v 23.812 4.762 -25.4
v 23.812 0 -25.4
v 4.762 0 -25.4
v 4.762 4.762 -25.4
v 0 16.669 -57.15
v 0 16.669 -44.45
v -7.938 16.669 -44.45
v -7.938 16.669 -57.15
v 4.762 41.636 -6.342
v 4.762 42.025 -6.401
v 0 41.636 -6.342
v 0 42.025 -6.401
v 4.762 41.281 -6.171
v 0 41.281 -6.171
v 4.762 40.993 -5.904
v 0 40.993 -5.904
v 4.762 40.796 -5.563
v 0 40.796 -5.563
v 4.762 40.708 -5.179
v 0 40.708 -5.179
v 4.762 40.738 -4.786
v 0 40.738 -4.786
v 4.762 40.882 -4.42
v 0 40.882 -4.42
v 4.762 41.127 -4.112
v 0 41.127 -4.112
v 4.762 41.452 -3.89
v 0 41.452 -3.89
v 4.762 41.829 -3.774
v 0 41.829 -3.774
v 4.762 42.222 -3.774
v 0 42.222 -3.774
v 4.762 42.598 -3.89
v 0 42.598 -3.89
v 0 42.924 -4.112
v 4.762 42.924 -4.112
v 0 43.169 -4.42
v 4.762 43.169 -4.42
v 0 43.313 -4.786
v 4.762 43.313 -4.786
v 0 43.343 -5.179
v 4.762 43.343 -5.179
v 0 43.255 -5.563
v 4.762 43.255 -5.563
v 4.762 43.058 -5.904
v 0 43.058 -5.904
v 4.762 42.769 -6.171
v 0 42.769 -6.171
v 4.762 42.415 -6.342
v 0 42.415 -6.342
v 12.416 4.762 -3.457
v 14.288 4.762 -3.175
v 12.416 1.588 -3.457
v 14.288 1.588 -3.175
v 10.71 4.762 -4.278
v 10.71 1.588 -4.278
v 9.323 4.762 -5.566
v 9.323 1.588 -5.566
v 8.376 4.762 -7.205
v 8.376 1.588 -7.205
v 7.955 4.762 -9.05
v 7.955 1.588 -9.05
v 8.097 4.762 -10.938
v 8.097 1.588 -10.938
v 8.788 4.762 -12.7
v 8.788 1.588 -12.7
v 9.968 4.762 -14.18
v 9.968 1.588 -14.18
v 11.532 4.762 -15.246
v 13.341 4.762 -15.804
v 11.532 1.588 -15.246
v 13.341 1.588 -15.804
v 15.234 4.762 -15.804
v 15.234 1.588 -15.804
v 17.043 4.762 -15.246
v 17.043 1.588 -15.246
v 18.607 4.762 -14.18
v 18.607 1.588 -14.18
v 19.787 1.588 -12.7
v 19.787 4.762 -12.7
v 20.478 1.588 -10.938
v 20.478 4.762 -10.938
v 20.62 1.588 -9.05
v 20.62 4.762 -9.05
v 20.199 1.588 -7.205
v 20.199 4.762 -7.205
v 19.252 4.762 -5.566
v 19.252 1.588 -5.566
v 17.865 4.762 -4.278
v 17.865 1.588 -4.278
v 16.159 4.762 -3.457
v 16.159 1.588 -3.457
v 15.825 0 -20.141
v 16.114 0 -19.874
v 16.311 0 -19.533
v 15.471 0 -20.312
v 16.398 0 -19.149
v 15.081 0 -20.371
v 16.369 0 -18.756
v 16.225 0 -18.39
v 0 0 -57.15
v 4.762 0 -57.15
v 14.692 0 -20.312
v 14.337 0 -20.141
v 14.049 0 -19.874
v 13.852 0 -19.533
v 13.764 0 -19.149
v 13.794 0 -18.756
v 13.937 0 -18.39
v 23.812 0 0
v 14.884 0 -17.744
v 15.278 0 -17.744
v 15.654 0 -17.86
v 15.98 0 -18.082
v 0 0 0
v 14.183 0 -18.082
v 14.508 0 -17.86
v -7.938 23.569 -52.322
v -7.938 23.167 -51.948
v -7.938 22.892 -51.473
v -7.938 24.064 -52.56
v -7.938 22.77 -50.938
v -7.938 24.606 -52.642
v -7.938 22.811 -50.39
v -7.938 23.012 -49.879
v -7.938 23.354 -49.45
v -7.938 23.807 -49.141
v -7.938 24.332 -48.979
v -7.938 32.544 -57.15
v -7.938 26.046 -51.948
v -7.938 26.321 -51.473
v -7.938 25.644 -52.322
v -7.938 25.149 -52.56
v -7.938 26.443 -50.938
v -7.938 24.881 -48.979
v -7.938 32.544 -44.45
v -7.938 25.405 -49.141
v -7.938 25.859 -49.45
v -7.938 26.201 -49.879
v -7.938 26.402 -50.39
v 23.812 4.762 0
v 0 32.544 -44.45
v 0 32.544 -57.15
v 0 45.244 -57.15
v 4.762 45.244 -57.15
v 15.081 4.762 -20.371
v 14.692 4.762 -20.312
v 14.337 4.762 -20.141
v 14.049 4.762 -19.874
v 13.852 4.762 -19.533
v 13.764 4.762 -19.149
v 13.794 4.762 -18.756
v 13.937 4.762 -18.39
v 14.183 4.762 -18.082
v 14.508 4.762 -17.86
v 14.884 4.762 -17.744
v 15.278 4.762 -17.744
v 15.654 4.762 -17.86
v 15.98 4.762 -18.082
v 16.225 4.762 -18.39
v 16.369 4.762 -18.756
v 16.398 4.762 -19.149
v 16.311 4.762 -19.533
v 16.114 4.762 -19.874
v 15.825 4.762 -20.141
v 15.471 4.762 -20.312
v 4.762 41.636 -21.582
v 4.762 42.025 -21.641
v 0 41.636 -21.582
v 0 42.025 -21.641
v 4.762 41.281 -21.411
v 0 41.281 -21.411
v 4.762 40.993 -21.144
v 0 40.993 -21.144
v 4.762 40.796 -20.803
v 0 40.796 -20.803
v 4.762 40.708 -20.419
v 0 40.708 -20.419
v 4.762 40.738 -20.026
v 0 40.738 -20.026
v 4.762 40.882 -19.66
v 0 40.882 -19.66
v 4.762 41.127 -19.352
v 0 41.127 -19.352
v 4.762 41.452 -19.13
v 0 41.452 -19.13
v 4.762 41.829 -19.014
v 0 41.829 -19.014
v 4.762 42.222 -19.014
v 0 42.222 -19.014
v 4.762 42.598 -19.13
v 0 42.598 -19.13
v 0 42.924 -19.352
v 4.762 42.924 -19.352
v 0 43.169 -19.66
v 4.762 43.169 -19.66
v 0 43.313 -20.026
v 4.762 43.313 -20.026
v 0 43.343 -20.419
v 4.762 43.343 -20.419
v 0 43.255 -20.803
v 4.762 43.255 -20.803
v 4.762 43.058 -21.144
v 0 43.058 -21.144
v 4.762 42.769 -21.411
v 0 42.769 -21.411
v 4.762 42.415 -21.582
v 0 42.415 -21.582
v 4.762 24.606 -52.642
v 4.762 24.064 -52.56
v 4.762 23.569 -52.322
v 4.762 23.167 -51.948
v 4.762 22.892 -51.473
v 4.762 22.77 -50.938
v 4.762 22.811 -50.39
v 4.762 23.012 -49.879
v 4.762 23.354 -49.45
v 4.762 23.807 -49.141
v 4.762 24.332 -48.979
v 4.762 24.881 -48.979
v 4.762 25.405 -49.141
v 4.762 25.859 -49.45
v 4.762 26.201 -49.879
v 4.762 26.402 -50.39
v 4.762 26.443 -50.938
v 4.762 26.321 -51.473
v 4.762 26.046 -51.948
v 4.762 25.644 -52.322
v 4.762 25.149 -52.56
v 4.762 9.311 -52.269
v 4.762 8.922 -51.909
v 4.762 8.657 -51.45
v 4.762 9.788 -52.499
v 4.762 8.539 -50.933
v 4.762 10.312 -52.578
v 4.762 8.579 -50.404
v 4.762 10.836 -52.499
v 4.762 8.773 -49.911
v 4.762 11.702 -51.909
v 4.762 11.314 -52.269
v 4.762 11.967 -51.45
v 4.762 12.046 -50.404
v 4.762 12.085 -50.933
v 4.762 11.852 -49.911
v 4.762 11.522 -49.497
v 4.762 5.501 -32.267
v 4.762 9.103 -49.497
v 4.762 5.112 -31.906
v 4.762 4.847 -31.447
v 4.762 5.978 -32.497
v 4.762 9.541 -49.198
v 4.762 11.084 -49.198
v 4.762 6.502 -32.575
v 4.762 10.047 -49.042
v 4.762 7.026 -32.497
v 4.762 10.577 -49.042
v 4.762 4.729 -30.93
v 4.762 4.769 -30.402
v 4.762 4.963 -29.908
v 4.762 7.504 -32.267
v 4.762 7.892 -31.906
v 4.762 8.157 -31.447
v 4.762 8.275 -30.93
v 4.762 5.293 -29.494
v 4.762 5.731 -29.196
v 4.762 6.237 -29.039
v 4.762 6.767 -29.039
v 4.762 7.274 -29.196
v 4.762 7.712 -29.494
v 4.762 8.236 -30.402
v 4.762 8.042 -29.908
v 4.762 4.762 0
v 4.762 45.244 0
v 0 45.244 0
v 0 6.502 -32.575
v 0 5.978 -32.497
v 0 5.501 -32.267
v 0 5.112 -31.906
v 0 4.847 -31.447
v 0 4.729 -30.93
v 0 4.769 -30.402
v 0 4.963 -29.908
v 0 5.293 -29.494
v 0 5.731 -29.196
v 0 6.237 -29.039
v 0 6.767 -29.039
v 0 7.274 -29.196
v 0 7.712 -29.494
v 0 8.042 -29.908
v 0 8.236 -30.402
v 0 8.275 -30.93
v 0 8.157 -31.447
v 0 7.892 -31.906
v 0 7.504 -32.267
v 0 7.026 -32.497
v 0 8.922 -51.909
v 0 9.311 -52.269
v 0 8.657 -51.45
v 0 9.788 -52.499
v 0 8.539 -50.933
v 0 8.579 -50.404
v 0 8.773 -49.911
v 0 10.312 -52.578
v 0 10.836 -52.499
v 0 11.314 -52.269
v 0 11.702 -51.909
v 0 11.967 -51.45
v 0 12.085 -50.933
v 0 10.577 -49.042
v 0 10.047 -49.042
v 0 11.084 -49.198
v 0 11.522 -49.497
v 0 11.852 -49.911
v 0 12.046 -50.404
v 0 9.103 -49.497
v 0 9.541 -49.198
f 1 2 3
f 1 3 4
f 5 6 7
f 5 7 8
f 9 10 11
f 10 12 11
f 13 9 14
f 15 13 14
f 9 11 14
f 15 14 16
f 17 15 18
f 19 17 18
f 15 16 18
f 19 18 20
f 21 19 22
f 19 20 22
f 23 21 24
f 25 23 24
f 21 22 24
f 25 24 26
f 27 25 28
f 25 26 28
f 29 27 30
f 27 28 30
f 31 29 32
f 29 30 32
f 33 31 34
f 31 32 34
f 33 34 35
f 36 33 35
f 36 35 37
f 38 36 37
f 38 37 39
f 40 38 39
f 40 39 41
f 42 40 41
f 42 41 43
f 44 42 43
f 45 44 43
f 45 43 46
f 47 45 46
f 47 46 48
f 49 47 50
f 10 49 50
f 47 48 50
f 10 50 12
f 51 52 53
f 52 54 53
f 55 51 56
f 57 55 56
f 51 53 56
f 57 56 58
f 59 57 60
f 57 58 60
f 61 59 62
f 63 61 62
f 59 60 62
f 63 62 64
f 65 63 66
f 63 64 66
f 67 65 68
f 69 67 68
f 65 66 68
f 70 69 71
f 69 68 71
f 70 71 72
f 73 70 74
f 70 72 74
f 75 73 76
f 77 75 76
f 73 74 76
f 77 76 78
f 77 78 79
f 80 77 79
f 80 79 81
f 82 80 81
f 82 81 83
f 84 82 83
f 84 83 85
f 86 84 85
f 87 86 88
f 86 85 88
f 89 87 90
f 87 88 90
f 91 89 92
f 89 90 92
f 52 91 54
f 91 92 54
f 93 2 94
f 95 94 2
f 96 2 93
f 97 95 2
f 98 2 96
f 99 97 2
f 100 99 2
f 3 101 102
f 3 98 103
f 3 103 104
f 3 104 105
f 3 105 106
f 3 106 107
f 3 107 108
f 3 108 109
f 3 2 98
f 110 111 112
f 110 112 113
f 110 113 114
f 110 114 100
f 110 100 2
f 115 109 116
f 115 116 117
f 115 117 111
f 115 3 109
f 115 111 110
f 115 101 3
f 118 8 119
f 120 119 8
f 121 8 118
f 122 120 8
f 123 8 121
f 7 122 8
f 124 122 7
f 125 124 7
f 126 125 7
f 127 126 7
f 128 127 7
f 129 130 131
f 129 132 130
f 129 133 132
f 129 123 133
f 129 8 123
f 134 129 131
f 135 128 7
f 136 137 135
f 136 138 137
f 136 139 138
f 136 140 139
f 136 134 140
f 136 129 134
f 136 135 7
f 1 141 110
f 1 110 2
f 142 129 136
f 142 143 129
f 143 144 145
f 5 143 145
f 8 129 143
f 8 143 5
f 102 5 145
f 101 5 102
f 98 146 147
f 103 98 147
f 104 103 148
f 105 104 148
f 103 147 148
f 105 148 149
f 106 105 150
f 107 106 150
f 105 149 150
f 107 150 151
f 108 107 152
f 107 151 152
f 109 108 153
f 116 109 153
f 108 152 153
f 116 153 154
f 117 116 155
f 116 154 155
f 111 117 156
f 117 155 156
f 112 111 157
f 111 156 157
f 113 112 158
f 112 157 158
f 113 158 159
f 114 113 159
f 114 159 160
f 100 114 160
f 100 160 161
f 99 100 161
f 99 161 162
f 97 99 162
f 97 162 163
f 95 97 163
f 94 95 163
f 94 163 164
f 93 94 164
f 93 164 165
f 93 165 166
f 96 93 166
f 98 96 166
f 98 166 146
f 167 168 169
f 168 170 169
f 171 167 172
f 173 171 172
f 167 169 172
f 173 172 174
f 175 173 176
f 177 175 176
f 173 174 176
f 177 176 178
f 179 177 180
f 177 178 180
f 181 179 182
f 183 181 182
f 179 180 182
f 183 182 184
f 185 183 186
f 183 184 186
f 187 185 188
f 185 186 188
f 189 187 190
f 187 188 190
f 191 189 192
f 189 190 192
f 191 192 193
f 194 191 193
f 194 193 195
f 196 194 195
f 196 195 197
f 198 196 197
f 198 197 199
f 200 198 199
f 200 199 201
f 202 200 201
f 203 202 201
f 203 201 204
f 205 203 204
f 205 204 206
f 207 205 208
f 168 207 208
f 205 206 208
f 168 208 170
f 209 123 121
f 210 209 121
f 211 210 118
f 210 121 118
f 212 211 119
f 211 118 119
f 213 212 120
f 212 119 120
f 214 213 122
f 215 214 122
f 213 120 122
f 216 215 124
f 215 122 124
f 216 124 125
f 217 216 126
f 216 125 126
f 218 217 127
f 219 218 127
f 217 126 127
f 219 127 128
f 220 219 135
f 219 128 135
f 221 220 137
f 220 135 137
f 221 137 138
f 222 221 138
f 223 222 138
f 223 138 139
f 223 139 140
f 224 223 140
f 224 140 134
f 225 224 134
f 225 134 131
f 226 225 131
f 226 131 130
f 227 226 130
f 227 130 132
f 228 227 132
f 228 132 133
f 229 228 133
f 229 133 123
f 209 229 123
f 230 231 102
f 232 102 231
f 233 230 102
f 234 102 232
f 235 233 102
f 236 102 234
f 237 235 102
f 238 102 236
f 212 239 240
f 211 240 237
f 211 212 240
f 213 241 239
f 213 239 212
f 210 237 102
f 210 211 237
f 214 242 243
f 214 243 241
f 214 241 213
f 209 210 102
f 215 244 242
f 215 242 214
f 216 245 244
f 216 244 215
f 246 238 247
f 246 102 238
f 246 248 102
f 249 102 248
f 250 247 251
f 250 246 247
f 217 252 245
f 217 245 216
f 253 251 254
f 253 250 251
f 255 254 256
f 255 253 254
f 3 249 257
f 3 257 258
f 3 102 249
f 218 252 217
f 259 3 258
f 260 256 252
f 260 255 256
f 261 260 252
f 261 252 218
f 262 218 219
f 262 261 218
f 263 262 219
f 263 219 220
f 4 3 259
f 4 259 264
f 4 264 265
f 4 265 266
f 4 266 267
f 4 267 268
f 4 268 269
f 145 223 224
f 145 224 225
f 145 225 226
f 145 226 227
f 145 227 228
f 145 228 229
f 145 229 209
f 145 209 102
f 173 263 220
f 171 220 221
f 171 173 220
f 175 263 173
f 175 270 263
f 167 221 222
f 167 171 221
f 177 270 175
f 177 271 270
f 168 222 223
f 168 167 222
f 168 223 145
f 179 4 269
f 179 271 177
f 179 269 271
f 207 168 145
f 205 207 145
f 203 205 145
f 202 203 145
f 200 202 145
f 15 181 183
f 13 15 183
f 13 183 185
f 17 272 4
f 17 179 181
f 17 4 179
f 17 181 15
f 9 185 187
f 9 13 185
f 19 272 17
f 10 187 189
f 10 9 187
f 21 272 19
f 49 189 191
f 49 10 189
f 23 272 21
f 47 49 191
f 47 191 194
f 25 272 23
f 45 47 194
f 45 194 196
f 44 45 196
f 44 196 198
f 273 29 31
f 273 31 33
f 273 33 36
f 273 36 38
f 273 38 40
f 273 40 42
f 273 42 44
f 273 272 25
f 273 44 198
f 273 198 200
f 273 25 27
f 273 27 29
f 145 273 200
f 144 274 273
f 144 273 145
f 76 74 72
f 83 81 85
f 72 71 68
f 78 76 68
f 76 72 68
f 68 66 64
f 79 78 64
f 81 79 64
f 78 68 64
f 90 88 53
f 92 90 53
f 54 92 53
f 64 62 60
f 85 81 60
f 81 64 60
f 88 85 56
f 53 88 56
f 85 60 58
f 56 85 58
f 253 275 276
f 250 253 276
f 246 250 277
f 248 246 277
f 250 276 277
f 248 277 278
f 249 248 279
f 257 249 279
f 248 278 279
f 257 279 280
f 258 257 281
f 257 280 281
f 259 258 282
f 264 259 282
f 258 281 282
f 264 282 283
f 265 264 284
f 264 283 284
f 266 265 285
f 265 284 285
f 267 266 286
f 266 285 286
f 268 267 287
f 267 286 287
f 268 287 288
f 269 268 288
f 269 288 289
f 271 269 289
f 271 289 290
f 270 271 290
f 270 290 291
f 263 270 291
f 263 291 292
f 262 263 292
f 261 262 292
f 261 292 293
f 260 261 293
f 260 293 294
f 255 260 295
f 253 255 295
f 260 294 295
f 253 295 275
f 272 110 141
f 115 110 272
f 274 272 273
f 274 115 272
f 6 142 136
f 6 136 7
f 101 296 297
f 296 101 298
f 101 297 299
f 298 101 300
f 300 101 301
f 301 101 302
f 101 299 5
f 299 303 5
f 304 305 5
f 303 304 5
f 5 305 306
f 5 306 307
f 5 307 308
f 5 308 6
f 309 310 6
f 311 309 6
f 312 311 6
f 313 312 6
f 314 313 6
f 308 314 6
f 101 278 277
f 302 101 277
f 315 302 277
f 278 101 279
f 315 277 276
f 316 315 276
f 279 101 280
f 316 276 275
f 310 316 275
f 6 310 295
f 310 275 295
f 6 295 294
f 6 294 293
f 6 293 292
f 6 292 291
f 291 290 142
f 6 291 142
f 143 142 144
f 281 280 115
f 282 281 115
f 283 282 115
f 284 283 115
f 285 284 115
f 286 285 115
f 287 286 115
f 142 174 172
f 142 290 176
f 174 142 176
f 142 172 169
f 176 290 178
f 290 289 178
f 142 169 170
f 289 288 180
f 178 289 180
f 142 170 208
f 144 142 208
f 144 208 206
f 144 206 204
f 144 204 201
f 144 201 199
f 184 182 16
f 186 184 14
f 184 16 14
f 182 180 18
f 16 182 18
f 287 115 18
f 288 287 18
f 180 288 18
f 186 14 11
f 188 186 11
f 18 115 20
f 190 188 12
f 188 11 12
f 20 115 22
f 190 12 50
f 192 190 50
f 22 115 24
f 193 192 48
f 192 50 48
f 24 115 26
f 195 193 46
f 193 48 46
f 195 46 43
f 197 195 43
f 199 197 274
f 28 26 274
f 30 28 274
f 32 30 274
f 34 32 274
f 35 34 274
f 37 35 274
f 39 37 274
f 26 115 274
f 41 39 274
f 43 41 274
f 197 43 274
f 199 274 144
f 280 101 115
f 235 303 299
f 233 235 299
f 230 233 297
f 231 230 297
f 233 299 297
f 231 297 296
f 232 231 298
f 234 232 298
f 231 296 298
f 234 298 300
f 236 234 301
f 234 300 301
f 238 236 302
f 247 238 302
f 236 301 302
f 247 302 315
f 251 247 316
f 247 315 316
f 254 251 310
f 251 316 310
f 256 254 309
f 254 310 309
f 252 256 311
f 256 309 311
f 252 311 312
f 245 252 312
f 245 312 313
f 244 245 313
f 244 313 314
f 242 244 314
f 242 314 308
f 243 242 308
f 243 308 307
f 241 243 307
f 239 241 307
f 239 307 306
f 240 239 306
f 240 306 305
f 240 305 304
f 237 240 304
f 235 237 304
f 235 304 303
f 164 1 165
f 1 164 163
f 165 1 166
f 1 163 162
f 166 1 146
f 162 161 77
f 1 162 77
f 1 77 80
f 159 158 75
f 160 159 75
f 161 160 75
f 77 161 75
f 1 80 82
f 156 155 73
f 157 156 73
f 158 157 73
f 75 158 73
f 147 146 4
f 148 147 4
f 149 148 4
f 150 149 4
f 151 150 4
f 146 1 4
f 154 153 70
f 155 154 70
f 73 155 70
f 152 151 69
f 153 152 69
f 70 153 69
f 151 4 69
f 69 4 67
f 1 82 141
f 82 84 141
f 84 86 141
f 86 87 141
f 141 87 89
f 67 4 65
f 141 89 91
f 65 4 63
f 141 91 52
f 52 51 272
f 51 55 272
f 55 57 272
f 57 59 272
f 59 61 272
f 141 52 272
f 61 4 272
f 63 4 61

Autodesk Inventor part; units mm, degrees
ref_plane "YZ Plane" through (0, 0, 0) normal (1, 0, 0) x (0, 1, 0)
ref_plane "XZ Plane" through (0, 0, 0) normal (0, 1, 0) x (-1, 0, 0)
ref_plane "XY Plane" through (0, 0, 0) normal (0, 0, 1) x (1, 0, 0)
sketch "Sketch1" plane through (0, 0, 0) normal (1, 0, 0) x (0, 1, 0)
  line L0 (0, 0) -> (45.2437, 0)
  line L1 (45.2437, 0) -> (45.2438, -57.15)
  line L2 (45.2438, -57.15) -> (0, -57.15)
  line L3 (0, -57.15) -> (0, 0)
  dimension "d0" = 45.2437
  dimension "d1" = 57.15
extrude "Extrusion1" add sketch "Sketch1" along normal blind 4.7625
sketch "Sketch3" plane through (4.7625, 0, 0) normal (1, 0, 0) x (0, 0, -1)
  line L0 (0, 45.2437) -> (0, 0)
  line L1 (0, 0) -> (57.15, 0)
  line L2 (57.15, 0) -> (57.15, 45.2438)
  line L3 (57.15, 45.2438) -> (0, 45.2437)
  line L4 (0, 0) -> (25.4, 0)
  line L5 (25.4, 0) -> (25.4, 4.7625)
  line L6 (25.4, 4.7625) -> (0, 4.7625)
  line L7 (0, 4.7625) -> (0, 0)
  dimension "d8" = 4.7625
extrude "Extrusion3" add sketch "Sketch3" along normal blind 19.05 contours L6 L5 L1 L0
sketch "Sketch4" plane through (0, 0, 0) normal (-1, 0, 0) x (0, 0, 1)
  line L0 (0, 0) -> (0, 45.2437)
  line L1 (0, 45.2437) -> (-57.15, 45.2438)
  line L2 (-57.15, 45.2438) -> (-57.15, 0)
  line L3 (-57.15, 0) -> (0, 0)
  line L4 (-57.15, 45.2438) -> (0, 45.2437)
  line L5 (-57.15, 45.2438) -> (-44.45, 45.2438)
  line L6 (-57.15, 29.3688) -> (-57.15, 45.2438)
  line L7 (-57.15, 0) -> (-57.15, 45.2438)
  line L8 (-57.15, 32.5438) -> (-44.45, 32.5438)
  line L9 (-44.45, 32.5438) -> (-44.45, 16.6688)
  line L10 (-44.45, 16.6688) -> (-57.15, 16.6688)
  line L11 (-57.15, 16.6688) -> (-57.15, 32.5438)
  point P0 (-12.7, 45.2437)
  dimension "d48" = 15.875
  dimension "d49" = 12.7
  dimension "d50" = 12.7
extrude "Extrusion4" add sketch "Sketch4" along normal blind 7.9375 contours L2 L8 L9 L10
sketch "Sketch5" plane through (4.7625, 0, 0) normal (1, 0, 0) x (0, 0, -1)
  line L0 (25.4, 4.7625) -> (25.4, 0)
  line L1 (25.4, 0) -> (57.15, 0)
  line L2 (57.15, 0) -> (57.15, 45.2438)
  line L3 (57.15, 45.2438) -> (0, 45.2437)
  line L4 (0, 45.2437) -> (0, 4.7625)
  line L5 (0, 4.7625) -> (25.4, 4.7625)
  line L6 (0, 45.2437) -> (0, 40.4812)
  line L7 (0, 40.4812) -> (12.7, 40.4812)
  line L8 (12.7, 40.4812) -> (12.7, 45.2437)
  line L9 (12.7, 45.2437) -> (0, 45.2437)
  point P0 (0, 0)
  point P1 (50.8, 24.6063)
  dimension "d16" = 20.6375
  dimension "d17" = 6.35
hole "Hole1" at (4.7625, 24.6063, -50.8) direction (-1, 0, 0) diameter 3.683 depth 14.9352 tip angle 118
sketch "Sketch6" plane through (4.7625, 4.7625, 0) normal (0, 1, 0) x (1, 0, 0)
  line L0 (0, 0) -> (0, 25.4)
  line L1 (0, 0) -> (19.05, 0)
  line L2 (19.05, 25.4) -> (19.05, 0)
  line L3 (0, 25.4) -> (19.05, 25.4)
  point P0 (-4.7625, 0)
  point P1 (9.525, 9.525)
  dimension "d25" = 9.525
  dimension "d26" = 9.525
hole "Hole2" at (14.2875, 4.7625, -9.525) direction (0, -1, 0) diameter 12.7 depth 3.175
sketch "Sketch10" plane through (0, 45.2438, 0) normal (0, 1, 0) x (1, 0, 0)
  line L0 (0, 0) -> (0, 57.15)
  line L1 (0, 0) -> (4.7625, 0)
  line L2 (4.7625, 57.15) -> (4.7625, 0)
  line L3 (0, 57.15) -> (4.7625, 57.15)
  point P0 (0, 0)
  point P1 (11.1125, 6.35)
hole "Hole3" at (11.1125, 45.2438, -6.35) direction (0, -1, 0) diameter 2.6416 depth 10.9728 tip angle 118
sketch "Sketch11" plane through (0, 0, -57.15) normal (0, -1, 0) x (1, 0, 0)
  line L0 (0, 0) -> (0, 57.15)
  line L1 (0, 0) -> (4.7625, 0)
  line L2 (4.7625, 31.75) -> (4.7625, 0)
  line L3 (4.7625, 31.75) -> (23.8125, 31.75)
  line L4 (23.8125, 57.15) -> (23.8125, 31.75)
  line L5 (0, 57.15) -> (23.8125, 57.15)
  point P0 (15.0812, 38.1)
  dimension "d58" = 6.35
hole "Hole4" at (15.0812, 0, -19.05) direction (0, 1, 0) diameter 2.6416 end through all
sketch "Sketch12" plane through (4.7625, 0, 0) normal (1, 0, 0) x (0, 0, -1)
  circle A0 centre (50.8, 24.6063) radius 1.8415
  line L0 (25.4, 4.7625) -> (25.4, 0)
  line L1 (25.4, 0) -> (57.15, 0)
  line L2 (57.15, 0) -> (57.15, 45.2438)
  line L3 (57.15, 45.2438) -> (0, 45.2437)
  line L4 (0, 45.2437) -> (0, 4.7625)
  line L5 (0, 4.7625) -> (25.4, 4.7625)
  point P0 (0, 0)
  point P1 (50.8, 10.3124)
  point P2 (30.7975, 6.5024)
  dimension "d66" = 6.35
  dimension "d67" = 10.3124
  dimension "d68" = 6.5024
  dimension "d69" = 26.3525
hole "Hole5" at (4.7625, 10.3124, -50.8) at (4.7625, 6.5024, -30.7975) direction (-1, 0, 0) diameter 3.556 end through all
sketch "Sketch13" plane through (4.7625, 0, 0) normal (1, 0, 0) x (0, 0, -1)
  line L0 (0, 45.2437) -> (0, 4.7625)
  point P0 (0, 0)
  point P1 (5.08, 42.0254)
  point P2 (20.32, 42.0254)
  dimension "d77" = 5.08
  dimension "d78" = 15.24
hole "Hole6" at (4.7625, 42.0254, -5.08) at (4.7625, 42.0254, -20.32) direction (-1, 0, 0) diameter 2.6416 end through all
properties part number "WheelIntake4.0Base"
